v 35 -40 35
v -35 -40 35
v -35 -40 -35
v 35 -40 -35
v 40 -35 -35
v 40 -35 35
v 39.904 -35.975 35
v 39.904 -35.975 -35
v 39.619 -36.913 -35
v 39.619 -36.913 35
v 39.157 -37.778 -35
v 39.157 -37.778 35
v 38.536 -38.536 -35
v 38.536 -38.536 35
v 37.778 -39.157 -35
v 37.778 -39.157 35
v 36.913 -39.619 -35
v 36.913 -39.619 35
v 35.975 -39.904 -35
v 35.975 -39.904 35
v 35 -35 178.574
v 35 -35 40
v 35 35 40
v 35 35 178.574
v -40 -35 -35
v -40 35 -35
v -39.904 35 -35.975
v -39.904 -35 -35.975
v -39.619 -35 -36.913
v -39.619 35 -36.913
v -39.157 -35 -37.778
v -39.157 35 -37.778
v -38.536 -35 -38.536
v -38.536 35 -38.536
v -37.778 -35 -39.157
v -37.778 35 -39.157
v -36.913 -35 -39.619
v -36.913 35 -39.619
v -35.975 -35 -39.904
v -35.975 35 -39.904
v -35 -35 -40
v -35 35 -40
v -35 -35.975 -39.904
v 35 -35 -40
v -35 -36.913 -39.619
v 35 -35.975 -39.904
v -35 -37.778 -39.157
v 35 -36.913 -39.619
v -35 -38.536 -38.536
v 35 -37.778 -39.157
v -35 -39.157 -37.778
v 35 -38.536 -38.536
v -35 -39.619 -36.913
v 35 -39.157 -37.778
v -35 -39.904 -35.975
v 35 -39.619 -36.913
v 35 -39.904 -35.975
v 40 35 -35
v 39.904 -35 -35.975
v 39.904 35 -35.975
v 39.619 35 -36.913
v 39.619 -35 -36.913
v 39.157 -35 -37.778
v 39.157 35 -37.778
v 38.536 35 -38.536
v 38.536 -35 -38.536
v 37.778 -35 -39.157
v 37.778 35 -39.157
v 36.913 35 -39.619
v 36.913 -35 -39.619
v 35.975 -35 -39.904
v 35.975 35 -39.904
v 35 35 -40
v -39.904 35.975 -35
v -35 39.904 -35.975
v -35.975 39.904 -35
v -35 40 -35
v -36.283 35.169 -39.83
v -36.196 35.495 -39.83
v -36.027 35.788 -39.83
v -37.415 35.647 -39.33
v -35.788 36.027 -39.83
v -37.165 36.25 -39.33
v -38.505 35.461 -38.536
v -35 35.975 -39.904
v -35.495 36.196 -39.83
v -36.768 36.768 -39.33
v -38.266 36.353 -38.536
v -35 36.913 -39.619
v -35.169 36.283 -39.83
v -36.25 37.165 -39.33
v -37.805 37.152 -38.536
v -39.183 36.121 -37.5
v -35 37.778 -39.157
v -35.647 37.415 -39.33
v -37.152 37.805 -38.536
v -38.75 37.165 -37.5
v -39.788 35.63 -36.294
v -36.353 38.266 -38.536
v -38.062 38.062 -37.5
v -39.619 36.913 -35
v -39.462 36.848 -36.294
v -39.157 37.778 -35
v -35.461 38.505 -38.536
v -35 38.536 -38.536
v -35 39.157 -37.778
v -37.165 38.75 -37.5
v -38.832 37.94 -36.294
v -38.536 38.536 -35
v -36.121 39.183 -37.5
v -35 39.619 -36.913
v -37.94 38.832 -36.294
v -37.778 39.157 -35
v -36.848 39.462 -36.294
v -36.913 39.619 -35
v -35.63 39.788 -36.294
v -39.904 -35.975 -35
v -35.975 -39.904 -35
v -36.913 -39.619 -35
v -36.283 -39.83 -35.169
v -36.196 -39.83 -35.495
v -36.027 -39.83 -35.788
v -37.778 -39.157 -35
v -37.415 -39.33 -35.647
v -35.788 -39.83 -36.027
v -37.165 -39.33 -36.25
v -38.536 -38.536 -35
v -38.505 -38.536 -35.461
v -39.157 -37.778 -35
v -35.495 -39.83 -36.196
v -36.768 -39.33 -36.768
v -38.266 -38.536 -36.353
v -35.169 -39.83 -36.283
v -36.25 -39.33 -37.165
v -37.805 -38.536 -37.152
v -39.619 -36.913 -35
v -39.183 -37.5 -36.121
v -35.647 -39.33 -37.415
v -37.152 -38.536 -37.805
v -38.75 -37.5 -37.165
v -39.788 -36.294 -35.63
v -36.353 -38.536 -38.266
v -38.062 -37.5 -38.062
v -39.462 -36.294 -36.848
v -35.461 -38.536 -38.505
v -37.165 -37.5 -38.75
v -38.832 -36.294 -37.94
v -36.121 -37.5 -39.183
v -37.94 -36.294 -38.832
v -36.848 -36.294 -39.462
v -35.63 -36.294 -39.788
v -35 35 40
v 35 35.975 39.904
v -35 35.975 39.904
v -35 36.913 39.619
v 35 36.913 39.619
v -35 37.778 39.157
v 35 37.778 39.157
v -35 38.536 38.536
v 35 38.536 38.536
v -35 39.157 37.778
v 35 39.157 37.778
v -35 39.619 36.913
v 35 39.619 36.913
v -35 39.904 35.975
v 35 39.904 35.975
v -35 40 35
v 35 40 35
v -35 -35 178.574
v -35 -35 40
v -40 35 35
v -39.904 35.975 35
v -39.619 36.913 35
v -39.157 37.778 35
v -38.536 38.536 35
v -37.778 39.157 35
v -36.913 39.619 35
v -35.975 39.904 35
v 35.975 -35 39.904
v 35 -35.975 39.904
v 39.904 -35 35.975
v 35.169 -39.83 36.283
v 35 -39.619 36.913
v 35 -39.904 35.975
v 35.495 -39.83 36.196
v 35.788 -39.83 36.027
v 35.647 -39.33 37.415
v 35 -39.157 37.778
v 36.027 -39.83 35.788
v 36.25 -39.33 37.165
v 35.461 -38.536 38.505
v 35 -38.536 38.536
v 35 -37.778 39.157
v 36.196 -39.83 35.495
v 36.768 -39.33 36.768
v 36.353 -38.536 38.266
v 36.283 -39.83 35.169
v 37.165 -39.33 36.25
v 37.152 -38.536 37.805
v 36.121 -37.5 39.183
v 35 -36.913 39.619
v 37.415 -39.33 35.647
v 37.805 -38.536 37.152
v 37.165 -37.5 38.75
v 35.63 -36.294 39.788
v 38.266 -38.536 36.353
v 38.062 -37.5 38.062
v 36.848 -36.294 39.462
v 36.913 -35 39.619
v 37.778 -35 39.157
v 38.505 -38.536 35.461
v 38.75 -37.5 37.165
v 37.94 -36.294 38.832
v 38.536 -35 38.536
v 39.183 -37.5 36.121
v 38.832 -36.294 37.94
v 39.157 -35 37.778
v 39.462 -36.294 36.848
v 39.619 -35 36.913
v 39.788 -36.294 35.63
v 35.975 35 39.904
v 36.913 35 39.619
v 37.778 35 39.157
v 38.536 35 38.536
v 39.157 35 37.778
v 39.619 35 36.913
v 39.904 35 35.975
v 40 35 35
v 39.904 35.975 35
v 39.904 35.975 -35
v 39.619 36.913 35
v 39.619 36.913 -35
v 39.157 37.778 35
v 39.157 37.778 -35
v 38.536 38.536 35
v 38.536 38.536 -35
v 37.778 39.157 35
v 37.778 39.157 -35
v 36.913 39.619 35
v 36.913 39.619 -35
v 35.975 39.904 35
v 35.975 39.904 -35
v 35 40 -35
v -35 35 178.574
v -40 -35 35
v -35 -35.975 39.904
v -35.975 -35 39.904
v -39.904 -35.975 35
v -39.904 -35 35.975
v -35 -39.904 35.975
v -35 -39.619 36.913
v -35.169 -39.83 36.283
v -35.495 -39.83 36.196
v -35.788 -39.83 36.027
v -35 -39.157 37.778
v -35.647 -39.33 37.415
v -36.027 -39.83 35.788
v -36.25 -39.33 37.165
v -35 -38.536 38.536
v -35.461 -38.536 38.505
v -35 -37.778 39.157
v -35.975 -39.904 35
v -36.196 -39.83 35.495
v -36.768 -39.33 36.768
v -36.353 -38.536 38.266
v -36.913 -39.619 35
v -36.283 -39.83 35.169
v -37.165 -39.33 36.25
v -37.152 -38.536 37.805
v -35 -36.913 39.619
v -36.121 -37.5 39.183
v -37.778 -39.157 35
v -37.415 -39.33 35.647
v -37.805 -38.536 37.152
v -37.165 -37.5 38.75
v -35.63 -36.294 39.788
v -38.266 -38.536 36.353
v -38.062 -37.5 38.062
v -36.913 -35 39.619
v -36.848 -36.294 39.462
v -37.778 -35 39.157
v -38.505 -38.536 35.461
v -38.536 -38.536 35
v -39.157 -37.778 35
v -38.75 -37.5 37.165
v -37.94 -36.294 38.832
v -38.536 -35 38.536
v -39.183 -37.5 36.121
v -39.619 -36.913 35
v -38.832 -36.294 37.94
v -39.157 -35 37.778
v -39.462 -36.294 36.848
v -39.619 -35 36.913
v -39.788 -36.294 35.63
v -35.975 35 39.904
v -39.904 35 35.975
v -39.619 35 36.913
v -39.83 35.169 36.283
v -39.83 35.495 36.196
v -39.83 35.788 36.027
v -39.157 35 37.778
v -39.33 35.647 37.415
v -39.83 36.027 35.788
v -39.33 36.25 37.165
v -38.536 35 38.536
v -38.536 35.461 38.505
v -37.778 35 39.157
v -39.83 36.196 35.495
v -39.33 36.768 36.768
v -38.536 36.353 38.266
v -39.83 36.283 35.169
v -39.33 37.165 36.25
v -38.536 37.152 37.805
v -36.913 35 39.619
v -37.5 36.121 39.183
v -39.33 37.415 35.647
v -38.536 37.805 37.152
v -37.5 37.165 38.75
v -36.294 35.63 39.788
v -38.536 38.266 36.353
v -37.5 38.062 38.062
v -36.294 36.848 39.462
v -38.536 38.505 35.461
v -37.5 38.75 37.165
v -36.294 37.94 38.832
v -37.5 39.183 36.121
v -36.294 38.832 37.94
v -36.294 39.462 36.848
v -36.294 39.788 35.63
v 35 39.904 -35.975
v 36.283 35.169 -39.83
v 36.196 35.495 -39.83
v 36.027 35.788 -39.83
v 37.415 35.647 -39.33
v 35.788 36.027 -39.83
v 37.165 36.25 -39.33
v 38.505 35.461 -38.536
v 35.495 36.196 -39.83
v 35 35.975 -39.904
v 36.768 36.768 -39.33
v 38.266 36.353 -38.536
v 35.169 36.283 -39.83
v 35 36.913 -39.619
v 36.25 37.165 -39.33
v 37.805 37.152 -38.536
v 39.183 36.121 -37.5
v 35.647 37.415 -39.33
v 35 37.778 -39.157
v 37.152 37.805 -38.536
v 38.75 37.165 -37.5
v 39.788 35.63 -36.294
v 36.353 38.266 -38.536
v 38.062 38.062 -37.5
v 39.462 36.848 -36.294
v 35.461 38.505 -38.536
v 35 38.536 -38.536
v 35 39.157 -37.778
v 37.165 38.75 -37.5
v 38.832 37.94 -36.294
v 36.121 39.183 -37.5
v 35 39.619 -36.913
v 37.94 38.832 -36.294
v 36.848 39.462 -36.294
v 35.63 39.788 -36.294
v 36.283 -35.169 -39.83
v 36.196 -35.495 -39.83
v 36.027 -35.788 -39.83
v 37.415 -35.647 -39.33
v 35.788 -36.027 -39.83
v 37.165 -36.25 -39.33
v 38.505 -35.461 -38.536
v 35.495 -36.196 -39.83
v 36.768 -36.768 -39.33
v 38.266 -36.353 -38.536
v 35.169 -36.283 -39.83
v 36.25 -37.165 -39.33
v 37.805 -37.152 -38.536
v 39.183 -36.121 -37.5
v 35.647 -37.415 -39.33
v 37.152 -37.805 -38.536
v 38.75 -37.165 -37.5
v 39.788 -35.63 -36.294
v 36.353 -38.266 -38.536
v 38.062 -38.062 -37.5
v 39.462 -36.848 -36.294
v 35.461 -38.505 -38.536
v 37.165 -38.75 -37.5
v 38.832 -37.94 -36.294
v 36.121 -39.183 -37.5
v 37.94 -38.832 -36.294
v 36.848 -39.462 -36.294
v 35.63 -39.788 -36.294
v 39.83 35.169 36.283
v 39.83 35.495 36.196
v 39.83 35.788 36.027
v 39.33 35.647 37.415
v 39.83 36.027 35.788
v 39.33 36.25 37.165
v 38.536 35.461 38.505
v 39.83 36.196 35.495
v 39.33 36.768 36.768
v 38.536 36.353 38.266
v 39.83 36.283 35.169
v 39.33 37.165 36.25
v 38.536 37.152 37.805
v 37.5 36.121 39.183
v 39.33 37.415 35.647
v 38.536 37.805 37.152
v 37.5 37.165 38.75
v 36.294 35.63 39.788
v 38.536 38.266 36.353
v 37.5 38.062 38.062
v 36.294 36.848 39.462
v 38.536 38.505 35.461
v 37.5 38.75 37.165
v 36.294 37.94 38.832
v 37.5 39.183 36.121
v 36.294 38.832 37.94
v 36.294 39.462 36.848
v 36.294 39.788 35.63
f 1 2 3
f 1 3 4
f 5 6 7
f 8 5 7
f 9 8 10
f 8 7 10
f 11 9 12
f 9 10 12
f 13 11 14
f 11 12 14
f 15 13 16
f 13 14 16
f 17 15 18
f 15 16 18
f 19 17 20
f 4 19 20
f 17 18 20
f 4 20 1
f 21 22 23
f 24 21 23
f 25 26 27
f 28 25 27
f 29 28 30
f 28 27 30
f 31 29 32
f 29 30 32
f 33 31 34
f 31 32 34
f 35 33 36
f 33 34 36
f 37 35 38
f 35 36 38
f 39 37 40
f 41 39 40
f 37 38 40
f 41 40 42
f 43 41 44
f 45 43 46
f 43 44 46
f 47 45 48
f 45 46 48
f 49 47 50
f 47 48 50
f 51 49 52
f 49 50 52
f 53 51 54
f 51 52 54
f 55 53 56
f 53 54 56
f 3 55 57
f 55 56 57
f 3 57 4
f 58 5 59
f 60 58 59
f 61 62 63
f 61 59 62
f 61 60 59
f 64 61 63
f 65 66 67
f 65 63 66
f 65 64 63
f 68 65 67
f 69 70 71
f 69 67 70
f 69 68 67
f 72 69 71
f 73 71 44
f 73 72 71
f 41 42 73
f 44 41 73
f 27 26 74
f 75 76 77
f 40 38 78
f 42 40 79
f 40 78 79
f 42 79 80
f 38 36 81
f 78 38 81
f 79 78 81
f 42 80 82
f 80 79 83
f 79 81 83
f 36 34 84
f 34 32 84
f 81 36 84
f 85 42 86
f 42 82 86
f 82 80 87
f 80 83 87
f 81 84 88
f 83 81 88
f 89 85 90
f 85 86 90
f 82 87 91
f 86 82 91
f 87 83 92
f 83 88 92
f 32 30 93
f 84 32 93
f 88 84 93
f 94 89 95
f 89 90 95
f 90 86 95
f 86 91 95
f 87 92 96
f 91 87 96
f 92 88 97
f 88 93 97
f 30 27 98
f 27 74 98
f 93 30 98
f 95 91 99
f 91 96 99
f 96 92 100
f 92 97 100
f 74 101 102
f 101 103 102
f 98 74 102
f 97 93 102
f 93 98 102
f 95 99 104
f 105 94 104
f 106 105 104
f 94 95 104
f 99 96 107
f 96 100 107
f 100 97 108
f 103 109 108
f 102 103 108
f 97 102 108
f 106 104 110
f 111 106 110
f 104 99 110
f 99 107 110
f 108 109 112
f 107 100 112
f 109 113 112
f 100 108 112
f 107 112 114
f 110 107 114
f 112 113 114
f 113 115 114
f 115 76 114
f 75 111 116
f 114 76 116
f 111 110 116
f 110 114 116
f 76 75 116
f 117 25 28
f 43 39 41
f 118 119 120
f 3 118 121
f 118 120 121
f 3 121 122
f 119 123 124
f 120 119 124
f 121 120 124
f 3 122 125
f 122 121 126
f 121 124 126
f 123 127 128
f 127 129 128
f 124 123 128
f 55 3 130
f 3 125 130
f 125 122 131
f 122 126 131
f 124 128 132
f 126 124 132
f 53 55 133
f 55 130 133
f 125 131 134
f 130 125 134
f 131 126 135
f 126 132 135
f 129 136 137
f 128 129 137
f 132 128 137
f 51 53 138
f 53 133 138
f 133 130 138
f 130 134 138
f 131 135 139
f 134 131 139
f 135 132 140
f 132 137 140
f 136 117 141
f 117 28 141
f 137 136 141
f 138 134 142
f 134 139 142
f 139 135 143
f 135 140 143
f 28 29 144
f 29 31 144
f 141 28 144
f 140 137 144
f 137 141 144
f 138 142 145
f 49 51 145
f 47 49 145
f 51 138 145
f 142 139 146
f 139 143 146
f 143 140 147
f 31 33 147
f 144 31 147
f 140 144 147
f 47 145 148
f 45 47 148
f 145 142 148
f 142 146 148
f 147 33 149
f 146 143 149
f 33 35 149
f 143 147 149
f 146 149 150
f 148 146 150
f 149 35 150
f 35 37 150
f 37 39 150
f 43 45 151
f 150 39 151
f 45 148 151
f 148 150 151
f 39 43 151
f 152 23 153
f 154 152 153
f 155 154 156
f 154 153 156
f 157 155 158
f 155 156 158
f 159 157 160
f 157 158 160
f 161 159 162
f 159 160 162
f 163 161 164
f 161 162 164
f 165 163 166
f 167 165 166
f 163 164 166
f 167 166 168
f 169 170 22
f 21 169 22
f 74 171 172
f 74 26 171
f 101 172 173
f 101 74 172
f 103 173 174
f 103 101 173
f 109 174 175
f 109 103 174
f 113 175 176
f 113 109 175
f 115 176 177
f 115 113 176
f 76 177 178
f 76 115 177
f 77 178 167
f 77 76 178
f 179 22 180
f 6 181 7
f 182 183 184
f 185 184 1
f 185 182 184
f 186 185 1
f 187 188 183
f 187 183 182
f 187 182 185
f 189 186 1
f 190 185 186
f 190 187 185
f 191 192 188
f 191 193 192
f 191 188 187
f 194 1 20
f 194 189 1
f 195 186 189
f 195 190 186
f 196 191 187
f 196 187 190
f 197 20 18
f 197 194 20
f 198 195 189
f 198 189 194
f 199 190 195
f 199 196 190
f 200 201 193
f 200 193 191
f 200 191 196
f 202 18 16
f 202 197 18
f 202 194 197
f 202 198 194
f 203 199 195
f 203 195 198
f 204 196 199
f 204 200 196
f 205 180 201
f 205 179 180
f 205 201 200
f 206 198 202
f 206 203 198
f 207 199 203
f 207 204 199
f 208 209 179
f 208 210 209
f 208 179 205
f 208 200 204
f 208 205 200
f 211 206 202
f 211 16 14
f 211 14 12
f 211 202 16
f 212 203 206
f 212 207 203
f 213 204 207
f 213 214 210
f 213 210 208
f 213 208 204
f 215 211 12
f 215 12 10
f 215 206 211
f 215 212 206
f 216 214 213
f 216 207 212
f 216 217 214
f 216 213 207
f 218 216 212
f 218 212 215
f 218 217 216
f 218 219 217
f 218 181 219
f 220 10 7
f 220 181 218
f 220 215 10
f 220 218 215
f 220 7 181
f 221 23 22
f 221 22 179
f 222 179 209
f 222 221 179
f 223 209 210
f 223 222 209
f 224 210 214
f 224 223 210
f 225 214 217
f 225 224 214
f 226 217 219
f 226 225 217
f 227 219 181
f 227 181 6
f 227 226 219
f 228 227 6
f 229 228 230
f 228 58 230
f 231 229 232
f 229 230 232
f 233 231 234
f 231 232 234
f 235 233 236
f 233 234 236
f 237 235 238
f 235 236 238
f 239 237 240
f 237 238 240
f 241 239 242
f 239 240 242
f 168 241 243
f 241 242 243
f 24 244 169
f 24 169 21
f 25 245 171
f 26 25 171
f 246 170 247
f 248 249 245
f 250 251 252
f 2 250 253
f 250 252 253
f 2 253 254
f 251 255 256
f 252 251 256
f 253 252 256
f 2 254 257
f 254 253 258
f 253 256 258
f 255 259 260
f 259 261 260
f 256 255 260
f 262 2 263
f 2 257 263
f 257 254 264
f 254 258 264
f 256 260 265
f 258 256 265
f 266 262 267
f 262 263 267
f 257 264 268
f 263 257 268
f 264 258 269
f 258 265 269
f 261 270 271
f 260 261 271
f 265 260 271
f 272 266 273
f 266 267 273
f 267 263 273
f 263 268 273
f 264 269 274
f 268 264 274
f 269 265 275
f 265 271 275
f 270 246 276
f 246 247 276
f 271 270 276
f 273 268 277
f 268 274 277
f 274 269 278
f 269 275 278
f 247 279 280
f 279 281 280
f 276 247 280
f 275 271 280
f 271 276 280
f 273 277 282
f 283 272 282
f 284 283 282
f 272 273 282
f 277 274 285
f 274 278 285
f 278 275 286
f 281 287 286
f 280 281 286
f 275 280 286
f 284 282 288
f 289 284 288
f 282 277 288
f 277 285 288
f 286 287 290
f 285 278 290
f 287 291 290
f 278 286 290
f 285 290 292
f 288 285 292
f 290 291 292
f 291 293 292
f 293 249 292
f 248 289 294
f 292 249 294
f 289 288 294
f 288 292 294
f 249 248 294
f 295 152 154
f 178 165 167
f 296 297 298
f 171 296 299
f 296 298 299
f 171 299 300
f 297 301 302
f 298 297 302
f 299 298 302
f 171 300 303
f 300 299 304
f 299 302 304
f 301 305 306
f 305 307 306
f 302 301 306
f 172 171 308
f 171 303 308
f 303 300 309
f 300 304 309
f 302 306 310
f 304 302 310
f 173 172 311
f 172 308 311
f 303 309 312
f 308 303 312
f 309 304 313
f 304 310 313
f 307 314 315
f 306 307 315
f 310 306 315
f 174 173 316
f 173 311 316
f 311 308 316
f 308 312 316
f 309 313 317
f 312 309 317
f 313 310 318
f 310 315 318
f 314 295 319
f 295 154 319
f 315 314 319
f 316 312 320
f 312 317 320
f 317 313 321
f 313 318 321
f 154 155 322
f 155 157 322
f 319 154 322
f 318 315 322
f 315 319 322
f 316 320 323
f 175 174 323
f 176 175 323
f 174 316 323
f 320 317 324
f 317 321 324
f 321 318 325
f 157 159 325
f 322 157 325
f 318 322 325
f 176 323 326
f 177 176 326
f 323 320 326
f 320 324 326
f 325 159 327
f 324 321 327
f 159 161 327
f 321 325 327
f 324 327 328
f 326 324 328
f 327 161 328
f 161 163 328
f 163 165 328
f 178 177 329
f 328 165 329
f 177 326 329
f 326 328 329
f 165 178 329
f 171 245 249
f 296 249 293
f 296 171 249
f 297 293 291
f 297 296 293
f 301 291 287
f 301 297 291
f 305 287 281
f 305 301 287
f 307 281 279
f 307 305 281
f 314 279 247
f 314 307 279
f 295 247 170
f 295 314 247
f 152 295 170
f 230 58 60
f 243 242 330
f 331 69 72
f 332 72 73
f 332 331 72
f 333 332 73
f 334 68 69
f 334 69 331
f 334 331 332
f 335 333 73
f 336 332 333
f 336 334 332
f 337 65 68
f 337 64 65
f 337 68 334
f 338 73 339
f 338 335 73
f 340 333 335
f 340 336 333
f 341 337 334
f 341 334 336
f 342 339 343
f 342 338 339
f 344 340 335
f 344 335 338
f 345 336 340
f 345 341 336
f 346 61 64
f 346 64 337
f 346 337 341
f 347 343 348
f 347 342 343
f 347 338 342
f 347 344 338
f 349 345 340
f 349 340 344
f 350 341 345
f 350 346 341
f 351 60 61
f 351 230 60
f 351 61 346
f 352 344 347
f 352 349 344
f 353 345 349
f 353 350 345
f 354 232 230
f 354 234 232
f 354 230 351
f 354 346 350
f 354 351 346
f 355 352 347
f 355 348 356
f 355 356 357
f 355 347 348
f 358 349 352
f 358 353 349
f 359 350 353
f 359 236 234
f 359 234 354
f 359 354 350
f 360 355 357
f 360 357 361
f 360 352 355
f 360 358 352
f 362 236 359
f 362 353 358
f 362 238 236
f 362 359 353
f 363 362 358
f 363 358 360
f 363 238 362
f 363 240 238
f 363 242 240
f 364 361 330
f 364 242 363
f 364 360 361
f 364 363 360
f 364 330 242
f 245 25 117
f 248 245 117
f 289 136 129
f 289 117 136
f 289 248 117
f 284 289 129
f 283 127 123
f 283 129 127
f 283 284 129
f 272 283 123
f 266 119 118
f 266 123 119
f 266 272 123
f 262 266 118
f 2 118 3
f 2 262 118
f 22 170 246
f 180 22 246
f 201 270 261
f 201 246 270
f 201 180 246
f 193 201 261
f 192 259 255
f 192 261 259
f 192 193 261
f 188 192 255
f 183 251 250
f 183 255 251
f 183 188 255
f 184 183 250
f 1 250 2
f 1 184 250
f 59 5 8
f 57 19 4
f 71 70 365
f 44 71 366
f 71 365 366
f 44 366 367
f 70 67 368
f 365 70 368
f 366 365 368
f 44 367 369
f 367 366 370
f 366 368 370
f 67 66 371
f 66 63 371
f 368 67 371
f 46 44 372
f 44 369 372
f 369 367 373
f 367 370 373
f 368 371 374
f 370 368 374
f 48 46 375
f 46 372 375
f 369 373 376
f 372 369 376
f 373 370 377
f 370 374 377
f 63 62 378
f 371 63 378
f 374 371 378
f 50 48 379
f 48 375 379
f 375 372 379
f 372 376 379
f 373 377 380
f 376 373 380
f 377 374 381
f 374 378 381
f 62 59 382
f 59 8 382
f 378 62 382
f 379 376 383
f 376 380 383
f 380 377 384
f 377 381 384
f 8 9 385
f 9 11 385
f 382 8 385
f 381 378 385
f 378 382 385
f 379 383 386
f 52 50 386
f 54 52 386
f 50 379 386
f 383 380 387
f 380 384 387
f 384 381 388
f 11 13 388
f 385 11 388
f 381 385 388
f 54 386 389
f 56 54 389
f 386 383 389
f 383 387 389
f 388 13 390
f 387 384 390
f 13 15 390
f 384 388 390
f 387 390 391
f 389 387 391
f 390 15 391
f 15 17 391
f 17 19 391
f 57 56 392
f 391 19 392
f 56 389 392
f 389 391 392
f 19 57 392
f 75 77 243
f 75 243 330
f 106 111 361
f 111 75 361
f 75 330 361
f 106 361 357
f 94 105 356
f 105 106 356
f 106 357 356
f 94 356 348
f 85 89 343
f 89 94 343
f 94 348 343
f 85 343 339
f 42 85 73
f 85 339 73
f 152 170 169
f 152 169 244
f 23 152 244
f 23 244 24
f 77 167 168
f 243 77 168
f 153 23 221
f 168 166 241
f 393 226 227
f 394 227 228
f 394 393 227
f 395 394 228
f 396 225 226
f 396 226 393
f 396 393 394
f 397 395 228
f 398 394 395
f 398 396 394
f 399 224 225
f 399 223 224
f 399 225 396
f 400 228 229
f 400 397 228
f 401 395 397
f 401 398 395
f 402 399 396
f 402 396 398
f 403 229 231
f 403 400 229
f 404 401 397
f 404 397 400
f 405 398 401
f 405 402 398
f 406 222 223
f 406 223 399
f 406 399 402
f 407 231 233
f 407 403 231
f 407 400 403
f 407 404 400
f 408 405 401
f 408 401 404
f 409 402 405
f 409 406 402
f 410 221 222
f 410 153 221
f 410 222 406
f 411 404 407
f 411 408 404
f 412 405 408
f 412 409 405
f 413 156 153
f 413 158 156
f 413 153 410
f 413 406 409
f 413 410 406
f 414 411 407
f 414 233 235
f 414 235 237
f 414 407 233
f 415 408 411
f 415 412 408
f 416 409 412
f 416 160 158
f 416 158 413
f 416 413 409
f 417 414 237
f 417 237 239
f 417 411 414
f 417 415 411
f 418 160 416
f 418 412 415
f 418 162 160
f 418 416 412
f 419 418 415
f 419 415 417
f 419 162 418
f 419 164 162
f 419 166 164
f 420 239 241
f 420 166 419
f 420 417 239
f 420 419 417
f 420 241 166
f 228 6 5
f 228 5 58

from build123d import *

# Parameters (mm, degrees)
F0_W     = 80
F0_H     = 80
F1_DEPTH = 40
F2_R     = 5
F3_DEPTH = 80.001


# Not quite as in the source:
# - a pattern or mirror of a feature is missing from the dataset's text; its kind, count and spacing are read off the source's solid


with BuildPart() as f1:
    # F0 (on Top) → F1 (new body, symmetric)
    with BuildSketch(Plane.XY):
        Rectangle(F0_W, F0_H)
    extrude(amount=F1_DEPTH, both=True)

    # F2
    f2_edges = [f1.edges().sort_by_distance(p)[0] for p in [
        (0, 40, 40),
        (-40, 0, 40),
        (40, 0, 40),
        (0, -40, 40),
        (40, 40, 0),
        (40, -40, 0),
        (40, 0, -40),
        (-40, 40, 0),
        (-40, 0, -40),
        (-40, -40, 0),
        (0, -40, -40),
        (0, 40, -40),
    ]]
    fillet(f2_edges, radius=F2_R)

    # F3 (add, through all): faces of the model
    f3_faces = [f1.faces().sort_by_distance(p)[0] for p in [
        (0, 0, -40),
        (0, 0, 40),
    ]]
    f3 = extrude(f3_faces, amount=-F3_DEPTH, dir=(0, 0, -1))

    # F3_copies: F3 across plane
    add(f3.mirror(Plane.XY.offset(69.287032)))


solid = f1.part
